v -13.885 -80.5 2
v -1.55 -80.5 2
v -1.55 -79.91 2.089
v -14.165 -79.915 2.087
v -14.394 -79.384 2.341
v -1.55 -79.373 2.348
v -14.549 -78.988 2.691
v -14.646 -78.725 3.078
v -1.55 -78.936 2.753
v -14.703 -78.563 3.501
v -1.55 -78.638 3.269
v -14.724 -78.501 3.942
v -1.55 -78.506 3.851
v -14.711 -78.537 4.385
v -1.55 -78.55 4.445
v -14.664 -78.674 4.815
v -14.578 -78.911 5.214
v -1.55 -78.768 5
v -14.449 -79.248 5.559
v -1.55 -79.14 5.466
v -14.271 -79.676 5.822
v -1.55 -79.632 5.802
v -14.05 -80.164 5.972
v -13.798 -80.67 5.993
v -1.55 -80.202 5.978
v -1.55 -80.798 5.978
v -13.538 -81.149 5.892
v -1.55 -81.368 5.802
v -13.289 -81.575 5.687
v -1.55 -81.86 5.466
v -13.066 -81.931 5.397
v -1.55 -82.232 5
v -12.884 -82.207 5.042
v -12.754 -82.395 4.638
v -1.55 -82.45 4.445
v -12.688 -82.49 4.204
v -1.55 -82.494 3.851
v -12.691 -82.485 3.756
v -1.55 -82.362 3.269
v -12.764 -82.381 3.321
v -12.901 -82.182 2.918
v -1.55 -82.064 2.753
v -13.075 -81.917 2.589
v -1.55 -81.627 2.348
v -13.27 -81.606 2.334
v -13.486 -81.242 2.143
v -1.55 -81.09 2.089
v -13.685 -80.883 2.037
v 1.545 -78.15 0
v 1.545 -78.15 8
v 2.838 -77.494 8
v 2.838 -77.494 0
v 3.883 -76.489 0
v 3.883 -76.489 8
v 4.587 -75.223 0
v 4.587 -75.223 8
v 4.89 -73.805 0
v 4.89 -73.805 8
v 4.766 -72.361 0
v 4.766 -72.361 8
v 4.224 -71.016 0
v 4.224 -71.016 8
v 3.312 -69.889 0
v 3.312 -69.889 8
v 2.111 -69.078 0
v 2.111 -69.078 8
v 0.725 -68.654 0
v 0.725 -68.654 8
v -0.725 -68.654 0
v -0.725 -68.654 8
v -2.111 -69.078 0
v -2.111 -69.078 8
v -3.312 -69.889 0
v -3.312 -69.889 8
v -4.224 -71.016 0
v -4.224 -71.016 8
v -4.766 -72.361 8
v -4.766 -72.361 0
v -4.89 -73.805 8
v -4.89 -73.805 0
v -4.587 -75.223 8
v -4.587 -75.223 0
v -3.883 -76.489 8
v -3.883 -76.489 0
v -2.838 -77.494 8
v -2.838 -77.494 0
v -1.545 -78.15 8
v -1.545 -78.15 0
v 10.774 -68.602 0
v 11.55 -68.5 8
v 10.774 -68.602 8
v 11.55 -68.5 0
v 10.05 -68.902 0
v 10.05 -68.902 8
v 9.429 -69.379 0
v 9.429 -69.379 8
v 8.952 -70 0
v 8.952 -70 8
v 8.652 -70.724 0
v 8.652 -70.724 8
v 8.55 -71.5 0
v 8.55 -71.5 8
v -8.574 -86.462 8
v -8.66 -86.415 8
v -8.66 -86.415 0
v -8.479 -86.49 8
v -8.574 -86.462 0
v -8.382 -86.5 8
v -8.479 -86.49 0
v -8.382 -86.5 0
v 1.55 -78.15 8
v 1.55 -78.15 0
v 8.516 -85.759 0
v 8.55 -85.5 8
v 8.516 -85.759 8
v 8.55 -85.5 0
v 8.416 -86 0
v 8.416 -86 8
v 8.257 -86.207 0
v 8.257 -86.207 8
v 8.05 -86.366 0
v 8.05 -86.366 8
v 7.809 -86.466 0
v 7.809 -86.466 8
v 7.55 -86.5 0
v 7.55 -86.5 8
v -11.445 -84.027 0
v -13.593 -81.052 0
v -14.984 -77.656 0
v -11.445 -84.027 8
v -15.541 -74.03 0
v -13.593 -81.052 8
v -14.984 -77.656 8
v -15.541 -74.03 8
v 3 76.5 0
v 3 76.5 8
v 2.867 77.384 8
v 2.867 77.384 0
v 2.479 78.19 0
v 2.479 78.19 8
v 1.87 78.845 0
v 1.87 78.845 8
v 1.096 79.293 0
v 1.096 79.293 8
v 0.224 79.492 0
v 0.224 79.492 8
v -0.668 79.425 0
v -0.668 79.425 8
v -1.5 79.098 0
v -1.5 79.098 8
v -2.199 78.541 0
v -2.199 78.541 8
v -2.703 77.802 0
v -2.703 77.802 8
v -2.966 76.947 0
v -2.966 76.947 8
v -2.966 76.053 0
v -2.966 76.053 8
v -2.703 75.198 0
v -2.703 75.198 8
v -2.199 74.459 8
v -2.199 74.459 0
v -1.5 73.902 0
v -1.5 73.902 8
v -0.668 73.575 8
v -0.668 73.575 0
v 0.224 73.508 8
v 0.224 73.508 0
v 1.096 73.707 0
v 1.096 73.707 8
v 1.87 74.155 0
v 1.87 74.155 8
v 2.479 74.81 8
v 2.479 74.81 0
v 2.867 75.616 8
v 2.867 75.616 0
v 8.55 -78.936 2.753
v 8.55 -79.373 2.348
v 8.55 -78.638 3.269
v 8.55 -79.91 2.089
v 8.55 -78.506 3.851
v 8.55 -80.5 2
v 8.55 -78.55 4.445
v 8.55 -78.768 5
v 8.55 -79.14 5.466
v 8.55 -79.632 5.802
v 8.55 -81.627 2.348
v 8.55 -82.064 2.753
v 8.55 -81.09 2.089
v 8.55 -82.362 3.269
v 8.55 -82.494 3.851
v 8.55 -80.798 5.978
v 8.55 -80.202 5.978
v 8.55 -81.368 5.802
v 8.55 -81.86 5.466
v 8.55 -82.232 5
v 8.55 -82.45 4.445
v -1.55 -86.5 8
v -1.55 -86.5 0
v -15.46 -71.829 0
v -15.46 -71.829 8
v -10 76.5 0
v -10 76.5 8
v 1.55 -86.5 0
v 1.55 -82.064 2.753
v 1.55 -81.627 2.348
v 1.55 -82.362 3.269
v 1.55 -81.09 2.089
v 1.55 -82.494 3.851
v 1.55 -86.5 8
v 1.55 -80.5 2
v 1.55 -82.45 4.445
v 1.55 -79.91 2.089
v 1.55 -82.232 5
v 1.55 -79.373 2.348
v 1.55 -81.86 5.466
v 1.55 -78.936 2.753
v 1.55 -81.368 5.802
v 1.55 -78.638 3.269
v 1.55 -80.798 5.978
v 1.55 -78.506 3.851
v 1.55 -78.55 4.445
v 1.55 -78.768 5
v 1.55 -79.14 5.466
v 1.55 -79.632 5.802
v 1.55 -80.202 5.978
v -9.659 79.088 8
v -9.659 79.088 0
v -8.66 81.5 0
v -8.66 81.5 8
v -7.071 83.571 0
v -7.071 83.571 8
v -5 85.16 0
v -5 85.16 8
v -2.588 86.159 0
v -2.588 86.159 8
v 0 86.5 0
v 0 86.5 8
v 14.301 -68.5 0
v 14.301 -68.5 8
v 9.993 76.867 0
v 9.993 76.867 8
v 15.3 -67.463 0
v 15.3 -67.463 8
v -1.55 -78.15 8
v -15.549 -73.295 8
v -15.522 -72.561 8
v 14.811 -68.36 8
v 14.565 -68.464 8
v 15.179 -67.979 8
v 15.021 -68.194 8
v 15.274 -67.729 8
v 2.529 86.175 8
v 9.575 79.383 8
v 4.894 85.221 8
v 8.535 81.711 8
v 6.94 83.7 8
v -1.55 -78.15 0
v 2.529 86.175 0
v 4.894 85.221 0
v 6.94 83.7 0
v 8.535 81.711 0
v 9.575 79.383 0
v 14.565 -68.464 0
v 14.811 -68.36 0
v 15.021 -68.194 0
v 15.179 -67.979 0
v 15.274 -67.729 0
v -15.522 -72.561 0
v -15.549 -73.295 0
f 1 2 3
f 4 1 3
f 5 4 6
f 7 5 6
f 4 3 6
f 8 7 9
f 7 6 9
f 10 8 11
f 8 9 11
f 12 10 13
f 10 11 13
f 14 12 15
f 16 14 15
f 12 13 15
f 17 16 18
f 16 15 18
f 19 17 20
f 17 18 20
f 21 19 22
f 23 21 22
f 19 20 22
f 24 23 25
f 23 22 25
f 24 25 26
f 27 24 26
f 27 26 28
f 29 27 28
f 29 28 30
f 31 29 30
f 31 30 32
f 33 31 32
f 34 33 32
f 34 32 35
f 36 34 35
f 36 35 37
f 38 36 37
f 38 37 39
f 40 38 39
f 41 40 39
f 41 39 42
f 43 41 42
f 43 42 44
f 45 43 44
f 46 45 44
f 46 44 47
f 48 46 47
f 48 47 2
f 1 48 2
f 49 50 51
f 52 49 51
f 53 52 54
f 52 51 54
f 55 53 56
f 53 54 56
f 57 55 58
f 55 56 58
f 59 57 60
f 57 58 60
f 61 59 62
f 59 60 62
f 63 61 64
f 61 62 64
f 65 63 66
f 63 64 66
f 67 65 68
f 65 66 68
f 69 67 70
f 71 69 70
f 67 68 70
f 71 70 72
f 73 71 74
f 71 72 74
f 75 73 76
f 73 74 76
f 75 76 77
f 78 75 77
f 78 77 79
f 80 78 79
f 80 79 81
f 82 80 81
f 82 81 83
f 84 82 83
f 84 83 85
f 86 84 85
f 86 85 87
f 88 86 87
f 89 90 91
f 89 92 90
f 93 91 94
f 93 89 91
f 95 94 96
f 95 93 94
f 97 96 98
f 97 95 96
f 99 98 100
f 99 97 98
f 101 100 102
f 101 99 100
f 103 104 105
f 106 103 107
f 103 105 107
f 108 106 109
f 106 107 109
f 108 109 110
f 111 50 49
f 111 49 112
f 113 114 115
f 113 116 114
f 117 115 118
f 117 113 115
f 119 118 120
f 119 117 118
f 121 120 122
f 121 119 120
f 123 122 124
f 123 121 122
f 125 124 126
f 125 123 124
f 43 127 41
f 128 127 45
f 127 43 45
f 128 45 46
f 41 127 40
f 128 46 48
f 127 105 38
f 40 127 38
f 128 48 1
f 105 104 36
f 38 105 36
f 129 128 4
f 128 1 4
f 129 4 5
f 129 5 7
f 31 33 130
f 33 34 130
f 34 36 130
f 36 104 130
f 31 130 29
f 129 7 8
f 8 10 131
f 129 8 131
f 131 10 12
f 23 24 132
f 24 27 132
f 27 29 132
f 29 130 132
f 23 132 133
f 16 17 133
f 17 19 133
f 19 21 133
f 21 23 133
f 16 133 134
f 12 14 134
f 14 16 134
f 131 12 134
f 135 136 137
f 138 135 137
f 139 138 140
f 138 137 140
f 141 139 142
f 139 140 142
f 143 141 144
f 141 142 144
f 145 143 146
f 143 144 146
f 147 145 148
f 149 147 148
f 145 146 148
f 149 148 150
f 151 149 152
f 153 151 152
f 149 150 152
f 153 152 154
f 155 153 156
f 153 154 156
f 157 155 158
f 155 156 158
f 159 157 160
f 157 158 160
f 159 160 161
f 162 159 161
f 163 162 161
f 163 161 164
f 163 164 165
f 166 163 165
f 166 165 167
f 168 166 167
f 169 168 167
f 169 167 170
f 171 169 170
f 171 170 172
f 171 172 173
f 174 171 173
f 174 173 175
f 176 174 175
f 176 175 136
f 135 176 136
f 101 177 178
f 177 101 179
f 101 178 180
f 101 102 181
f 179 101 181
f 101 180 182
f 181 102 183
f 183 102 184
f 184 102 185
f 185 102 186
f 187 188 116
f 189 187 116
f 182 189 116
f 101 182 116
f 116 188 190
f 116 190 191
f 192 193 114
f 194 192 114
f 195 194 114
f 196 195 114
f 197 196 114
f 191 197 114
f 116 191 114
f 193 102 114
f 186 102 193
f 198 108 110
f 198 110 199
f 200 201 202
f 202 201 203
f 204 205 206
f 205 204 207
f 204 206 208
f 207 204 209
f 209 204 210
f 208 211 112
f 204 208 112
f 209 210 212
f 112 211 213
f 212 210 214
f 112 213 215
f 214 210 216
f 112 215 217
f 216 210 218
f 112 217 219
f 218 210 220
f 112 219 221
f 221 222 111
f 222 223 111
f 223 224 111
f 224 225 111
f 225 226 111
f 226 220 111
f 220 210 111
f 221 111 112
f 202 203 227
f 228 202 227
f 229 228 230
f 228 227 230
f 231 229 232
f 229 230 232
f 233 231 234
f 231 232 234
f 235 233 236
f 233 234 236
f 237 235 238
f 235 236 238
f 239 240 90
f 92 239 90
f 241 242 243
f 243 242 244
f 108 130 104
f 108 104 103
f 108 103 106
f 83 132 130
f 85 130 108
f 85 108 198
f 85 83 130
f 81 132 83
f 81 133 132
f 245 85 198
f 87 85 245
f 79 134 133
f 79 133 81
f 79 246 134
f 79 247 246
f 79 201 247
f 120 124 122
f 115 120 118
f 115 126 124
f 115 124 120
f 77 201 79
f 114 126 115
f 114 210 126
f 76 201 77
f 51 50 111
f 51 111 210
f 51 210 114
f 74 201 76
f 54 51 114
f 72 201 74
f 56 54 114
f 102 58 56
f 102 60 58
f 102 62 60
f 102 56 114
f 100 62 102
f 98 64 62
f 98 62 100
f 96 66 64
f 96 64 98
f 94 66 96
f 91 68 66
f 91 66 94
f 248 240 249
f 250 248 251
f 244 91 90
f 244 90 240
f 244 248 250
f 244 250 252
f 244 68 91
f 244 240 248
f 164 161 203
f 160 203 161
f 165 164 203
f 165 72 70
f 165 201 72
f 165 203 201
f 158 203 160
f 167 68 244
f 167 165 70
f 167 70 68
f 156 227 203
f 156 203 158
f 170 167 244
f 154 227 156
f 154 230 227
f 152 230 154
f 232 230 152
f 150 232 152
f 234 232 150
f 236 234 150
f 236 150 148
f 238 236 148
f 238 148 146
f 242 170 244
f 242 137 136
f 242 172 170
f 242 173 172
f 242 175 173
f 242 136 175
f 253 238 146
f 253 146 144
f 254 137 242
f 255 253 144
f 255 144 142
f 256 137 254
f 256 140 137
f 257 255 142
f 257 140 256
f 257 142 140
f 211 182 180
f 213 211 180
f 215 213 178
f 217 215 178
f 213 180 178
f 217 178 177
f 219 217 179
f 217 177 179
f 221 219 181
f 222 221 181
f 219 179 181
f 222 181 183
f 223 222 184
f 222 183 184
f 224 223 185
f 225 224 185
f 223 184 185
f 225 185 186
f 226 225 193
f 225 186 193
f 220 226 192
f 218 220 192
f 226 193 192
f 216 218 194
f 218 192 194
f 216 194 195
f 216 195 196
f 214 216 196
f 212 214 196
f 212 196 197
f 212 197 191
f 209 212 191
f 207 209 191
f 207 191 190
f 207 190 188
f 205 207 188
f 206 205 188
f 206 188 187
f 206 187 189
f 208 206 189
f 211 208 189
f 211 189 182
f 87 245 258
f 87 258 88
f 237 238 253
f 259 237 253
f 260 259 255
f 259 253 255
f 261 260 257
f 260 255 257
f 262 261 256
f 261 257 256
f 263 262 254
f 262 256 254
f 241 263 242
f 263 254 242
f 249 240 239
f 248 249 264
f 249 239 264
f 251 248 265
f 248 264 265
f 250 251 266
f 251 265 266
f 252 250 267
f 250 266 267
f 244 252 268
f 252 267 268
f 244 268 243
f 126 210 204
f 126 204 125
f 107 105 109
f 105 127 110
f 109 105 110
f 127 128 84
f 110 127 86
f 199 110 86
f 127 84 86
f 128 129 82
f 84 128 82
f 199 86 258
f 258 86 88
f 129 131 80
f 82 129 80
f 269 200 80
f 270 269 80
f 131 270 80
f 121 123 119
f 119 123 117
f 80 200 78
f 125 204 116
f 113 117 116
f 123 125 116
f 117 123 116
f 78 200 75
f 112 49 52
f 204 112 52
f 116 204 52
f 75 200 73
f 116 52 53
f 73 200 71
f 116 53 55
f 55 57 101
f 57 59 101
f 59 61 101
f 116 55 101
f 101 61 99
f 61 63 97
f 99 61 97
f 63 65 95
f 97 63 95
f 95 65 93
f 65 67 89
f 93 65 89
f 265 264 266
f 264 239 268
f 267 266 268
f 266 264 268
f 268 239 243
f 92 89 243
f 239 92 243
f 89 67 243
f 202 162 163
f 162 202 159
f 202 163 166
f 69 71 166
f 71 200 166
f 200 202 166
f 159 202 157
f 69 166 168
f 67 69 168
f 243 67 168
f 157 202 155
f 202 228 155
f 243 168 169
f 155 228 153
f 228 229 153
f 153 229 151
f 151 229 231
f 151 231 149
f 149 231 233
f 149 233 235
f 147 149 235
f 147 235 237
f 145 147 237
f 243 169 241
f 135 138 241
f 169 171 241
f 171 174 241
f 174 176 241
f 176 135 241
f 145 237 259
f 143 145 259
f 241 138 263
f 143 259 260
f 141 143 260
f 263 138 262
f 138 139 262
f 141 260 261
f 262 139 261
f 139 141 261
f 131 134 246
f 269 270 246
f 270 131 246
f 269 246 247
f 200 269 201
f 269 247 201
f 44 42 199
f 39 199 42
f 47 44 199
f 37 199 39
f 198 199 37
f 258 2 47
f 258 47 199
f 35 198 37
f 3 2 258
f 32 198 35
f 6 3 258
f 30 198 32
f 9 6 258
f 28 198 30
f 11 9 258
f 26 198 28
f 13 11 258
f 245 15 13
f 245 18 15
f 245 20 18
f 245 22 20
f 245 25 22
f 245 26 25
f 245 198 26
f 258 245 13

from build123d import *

# Parameters (mm, degrees)
SKETCH1_W           = 32
SKETCH1_H           = 173
BOSS_EXTRUDE2_DEPTH = 8
SKETCH3_R           = 4.9
SKETCH3_R_2         = 3
SKETCH3_W           = 3.1
SKETCH3_H           = 8.35
CUT_EXTRUDE1_DEPTH  = 9
CUT_EXTRUDE4_DEPTH  = 9
FILLET1_R           = 1
FILLET3_R           = 1
FILLET5_R           = 3
FILLET6_R           = 0.5
SKETCH7_R           = 2
CUT_EXTRUDE5_DEPTH  = 25.1


with BuildPart() as part:
    # Sketch1 → Boss-Extrude2 (new body)
    with BuildSketch(Plane.XY):
        Rectangle(SKETCH1_W, SKETCH1_H)
    extrude(amount=BOSS_EXTRUDE2_DEPTH)

    # Sketch3 → Cut-Extrude1 (cut, through all)
    with BuildSketch(Plane.XY.offset(8)):
        with Locations((0, -73.5)):
            Circle(SKETCH3_R)
        with Locations((0, 76.5)):
            Circle(SKETCH3_R_2)
        with Locations((0, -82.325)):
            Rectangle(SKETCH3_W, SKETCH3_H)
    extrude(amount=-CUT_EXTRUDE1_DEPTH, mode=Mode.SUBTRACT)

    # Sketch5 → Cut-Extrude4 (cut, through all)
    with BuildSketch(Plane.XY.offset(8)):
        with BuildLine():
            Line((-16, 86.5), (-16, -86.5))
            Line((-16, -86.5), (-15.540973095, -74.029769072))
            ThreePointArc((-15.540973095, -74.029769072), (-15.53947586, -72.927994754), (-15.459966578, -71.829092044))
            Line((-15.459966578, -71.829092044), (-10, 76.5))
            ThreePointArc((-10, 76.5), (-7.07106782, 83.571067803), (-2.4e-08, 86.5))
            Line((-2.4e-08, 86.5), (-16, 86.5))
        make_face()
        with BuildLine():
            Line((16, 86.5), (-2.4e-08, 86.5))
            ThreePointArc((-2.4e-08, 86.5), (6.939944042, 83.699803935), (9.993247284, 76.867435316))
            Line((9.993247284, 76.867435316), (15.338169515, -68.5))
            Line((15.338169515, -68.5), (8.55, -68.5))
            Line((8.55, -68.5), (8.55, -86.5))
            Line((8.55, -86.5), (16, -86.5))
            Line((16, -86.5), (16, 86.5))
        make_face()
        with BuildLine():
            Line((-15.540973095, -74.029769072), (-16, -86.5))
            Line((-16, -86.5), (-8.532438104, -86.5))
            ThreePointArc((-8.532438104, -86.5), (-13.555771706, -81.118631994), (-15.540973095, -74.029769072))
        make_face()
    extrude(amount=-CUT_EXTRUDE4_DEPTH, mode=Mode.SUBTRACT)

    # Fillet1
    fillet1_edges = [part.edges().sort_by_distance(p)[0] for p in [
        (8.55, -86.5, 4),
    ]]
    fillet(fillet1_edges, radius=FILLET1_R)

    # Fillet3
    fillet3_edges = [part.edges().sort_by_distance(p)[0] for p in [
        (15.338169515, -68.5, 4),
    ]]
    fillet(fillet3_edges, radius=FILLET3_R)

    # Fillet5
    fillet5_edges = [part.edges().sort_by_distance(p)[0] for p in [
        (8.55, -68.5, 4),
    ]]
    fillet(fillet5_edges, radius=FILLET5_R)

    # Fillet6
    fillet6_edges = [part.edges().sort_by_distance(p)[0] for p in [
        (-8.532438104, -86.5, 4),
    ]]
    fillet(fillet6_edges, radius=FILLET6_R)

    # Sketch7 → Cut-Extrude5 (cut, through all)
    with BuildSketch(Plane(origin=(8.55, 0, 0), x_dir=(0, 0, -1), z_dir=(1, 0, 0))):
        with Locations((-4, -80.5)):
            Circle(SKETCH7_R)
    extrude(amount=-CUT_EXTRUDE5_DEPTH, mode=Mode.SUBTRACT)


solid = part.part
